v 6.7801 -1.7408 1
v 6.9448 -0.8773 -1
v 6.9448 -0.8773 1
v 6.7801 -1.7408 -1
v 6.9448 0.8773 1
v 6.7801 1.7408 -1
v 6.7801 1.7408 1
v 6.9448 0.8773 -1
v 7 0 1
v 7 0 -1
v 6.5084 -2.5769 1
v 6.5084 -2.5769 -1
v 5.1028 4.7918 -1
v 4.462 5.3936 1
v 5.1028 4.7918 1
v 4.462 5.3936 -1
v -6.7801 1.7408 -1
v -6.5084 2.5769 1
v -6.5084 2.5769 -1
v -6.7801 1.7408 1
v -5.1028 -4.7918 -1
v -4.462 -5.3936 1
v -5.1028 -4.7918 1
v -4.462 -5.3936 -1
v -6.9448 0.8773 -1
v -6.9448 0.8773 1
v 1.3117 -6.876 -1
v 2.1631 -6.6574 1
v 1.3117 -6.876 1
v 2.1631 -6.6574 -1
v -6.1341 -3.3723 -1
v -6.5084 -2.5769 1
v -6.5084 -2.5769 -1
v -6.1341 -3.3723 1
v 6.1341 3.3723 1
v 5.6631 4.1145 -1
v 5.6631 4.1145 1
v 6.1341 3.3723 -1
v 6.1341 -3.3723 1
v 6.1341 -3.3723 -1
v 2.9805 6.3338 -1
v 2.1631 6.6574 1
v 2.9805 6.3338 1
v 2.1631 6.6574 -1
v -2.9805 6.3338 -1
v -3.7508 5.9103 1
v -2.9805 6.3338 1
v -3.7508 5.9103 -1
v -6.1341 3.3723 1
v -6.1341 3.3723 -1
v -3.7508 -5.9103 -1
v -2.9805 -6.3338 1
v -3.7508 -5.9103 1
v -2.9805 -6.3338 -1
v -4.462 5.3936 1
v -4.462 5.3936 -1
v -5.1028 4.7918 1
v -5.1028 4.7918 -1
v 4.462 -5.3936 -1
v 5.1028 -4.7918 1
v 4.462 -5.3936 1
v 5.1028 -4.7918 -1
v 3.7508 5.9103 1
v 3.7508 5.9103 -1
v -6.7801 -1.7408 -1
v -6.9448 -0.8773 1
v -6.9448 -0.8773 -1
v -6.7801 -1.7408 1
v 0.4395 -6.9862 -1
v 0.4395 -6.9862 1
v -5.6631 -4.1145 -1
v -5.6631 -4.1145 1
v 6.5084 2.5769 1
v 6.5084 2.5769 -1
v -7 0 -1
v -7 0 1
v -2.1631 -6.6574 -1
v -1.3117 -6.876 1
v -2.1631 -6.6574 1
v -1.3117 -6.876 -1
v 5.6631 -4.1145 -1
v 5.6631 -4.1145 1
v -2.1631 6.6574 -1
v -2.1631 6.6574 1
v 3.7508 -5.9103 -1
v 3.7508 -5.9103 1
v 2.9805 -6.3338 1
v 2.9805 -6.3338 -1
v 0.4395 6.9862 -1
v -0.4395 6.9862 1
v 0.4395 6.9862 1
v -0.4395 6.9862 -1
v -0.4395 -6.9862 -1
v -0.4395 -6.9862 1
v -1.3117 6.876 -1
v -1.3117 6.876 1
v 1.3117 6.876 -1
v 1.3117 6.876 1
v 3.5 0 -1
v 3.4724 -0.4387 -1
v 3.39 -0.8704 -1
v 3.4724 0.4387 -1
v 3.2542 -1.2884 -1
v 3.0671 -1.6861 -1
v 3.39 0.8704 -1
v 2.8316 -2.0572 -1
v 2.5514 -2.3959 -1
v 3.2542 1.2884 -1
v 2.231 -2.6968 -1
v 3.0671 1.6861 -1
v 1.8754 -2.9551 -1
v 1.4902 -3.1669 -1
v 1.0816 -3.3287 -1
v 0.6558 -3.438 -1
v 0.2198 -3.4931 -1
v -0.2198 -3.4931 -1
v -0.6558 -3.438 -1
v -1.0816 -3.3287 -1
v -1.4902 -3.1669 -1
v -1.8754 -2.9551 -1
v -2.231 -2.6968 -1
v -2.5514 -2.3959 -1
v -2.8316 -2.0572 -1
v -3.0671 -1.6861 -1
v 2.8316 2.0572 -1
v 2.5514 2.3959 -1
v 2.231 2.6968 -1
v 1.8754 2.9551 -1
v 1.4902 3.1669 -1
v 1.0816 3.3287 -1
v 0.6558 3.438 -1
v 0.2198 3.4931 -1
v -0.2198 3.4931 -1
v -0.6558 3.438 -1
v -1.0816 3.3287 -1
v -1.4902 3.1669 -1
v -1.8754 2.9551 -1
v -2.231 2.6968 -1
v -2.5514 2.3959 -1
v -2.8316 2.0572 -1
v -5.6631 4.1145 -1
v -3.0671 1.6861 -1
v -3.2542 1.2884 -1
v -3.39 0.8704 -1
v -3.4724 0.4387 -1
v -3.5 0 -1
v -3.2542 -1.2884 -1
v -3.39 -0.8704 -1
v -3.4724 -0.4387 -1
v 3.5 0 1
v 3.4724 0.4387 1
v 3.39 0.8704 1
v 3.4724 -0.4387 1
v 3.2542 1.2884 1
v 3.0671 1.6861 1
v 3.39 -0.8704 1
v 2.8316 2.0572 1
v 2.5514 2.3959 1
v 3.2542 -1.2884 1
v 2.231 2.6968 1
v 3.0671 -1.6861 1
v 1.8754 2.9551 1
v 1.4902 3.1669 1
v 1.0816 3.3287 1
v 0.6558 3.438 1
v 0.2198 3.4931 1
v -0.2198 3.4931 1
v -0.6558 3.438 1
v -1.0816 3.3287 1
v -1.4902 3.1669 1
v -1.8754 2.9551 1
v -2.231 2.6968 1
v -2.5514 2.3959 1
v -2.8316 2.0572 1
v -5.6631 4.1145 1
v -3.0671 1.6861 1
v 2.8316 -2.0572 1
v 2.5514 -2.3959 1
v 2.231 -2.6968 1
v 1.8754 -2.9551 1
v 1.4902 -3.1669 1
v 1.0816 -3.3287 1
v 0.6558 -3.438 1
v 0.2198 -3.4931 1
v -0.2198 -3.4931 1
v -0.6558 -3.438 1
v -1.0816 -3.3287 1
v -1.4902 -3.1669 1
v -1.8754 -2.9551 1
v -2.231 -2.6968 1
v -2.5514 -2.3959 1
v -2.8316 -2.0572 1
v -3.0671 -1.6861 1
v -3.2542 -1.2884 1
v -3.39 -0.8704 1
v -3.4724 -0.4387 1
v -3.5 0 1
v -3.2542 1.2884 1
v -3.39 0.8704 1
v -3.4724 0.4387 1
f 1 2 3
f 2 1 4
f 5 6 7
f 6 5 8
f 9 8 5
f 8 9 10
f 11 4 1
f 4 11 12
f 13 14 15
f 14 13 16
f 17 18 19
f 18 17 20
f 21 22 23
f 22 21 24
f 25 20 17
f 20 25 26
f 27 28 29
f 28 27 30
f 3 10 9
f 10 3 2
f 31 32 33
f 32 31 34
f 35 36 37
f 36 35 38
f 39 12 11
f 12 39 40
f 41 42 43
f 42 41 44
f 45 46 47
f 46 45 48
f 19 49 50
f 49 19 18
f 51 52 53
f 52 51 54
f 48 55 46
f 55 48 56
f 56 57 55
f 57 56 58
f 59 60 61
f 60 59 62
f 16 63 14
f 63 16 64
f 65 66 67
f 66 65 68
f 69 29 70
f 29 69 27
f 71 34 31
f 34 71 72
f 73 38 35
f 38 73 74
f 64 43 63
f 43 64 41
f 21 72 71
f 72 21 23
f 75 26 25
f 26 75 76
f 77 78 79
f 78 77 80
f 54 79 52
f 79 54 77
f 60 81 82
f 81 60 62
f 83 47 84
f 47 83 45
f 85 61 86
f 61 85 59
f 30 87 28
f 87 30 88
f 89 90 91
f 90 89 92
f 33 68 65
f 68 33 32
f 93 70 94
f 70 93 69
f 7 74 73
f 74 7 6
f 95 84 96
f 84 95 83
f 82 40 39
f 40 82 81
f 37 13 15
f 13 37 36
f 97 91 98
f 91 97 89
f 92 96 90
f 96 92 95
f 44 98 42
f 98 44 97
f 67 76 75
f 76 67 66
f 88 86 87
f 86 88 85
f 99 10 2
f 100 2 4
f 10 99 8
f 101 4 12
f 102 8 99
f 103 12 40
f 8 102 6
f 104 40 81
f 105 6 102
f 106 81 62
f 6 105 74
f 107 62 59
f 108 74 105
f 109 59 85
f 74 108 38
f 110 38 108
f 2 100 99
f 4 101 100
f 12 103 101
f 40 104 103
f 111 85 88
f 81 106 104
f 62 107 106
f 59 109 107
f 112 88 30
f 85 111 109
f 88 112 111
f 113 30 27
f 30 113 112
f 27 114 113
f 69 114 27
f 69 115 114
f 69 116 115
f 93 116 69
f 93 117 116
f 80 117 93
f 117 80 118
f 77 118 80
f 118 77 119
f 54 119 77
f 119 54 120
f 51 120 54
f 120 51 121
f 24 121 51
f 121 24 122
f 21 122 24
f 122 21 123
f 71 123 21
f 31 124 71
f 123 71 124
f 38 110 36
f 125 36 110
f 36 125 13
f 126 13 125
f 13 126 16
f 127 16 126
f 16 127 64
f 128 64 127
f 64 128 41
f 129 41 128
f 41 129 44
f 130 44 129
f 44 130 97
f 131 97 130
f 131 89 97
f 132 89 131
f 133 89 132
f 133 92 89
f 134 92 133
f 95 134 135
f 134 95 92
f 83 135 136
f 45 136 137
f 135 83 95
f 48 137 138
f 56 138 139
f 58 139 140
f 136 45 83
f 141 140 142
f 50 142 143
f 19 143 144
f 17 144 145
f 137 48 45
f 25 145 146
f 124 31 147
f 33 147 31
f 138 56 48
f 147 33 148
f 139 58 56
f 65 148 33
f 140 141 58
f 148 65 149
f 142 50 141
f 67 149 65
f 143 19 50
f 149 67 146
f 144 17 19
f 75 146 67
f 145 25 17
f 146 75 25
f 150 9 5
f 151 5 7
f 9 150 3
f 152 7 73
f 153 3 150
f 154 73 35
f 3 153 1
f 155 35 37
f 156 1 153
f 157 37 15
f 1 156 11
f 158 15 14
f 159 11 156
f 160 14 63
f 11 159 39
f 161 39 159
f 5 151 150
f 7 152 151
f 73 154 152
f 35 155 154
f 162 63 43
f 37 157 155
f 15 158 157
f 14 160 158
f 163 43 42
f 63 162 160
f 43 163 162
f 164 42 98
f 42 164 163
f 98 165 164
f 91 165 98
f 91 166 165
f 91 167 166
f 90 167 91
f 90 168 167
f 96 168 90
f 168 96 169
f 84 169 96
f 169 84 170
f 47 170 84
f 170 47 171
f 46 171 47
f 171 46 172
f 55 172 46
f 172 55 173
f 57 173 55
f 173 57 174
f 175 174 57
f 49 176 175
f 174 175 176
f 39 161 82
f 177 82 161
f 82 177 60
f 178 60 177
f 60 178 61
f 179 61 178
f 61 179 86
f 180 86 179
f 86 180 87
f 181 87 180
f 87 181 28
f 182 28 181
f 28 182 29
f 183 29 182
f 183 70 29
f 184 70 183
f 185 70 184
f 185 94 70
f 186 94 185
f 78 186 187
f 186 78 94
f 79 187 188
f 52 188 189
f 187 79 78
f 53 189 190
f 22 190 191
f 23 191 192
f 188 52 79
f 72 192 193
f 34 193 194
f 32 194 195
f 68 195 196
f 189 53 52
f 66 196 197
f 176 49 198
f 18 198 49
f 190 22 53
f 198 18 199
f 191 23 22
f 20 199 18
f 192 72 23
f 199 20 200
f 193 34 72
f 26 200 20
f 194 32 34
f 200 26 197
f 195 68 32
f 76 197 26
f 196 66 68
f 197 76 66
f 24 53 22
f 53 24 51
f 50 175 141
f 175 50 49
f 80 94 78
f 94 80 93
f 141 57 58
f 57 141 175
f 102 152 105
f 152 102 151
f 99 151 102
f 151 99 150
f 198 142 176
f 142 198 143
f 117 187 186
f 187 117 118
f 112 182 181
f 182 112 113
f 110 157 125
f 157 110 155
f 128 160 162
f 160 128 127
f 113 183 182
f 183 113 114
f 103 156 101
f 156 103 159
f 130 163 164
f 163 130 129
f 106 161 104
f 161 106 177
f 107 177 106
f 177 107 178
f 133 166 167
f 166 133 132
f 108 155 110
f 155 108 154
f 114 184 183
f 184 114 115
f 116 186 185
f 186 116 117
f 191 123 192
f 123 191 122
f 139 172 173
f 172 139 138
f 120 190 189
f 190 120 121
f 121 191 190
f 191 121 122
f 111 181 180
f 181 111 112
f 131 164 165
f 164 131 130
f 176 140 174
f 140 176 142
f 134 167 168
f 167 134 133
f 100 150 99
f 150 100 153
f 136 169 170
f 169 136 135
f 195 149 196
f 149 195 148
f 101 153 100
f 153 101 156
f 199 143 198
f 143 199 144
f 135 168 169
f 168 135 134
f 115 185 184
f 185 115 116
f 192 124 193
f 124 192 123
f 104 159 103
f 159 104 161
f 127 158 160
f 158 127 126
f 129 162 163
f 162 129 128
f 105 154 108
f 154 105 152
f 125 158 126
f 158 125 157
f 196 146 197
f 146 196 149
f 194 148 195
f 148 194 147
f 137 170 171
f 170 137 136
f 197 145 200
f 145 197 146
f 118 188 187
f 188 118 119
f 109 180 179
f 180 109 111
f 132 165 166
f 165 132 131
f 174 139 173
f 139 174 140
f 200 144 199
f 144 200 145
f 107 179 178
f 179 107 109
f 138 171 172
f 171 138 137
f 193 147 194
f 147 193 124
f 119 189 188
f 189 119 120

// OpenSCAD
$fn = 50;


difference() {
	union() {
		translate(v = [0, 0, -1.0000000000]) {
			cylinder(h = 2, r = 7.0000000000);
		}
	}
	union() {
		translate(v = [0, 0, -100.0000000000]) {
			cylinder(h = 200, r = 3.5000000000);
		}
	}
}
